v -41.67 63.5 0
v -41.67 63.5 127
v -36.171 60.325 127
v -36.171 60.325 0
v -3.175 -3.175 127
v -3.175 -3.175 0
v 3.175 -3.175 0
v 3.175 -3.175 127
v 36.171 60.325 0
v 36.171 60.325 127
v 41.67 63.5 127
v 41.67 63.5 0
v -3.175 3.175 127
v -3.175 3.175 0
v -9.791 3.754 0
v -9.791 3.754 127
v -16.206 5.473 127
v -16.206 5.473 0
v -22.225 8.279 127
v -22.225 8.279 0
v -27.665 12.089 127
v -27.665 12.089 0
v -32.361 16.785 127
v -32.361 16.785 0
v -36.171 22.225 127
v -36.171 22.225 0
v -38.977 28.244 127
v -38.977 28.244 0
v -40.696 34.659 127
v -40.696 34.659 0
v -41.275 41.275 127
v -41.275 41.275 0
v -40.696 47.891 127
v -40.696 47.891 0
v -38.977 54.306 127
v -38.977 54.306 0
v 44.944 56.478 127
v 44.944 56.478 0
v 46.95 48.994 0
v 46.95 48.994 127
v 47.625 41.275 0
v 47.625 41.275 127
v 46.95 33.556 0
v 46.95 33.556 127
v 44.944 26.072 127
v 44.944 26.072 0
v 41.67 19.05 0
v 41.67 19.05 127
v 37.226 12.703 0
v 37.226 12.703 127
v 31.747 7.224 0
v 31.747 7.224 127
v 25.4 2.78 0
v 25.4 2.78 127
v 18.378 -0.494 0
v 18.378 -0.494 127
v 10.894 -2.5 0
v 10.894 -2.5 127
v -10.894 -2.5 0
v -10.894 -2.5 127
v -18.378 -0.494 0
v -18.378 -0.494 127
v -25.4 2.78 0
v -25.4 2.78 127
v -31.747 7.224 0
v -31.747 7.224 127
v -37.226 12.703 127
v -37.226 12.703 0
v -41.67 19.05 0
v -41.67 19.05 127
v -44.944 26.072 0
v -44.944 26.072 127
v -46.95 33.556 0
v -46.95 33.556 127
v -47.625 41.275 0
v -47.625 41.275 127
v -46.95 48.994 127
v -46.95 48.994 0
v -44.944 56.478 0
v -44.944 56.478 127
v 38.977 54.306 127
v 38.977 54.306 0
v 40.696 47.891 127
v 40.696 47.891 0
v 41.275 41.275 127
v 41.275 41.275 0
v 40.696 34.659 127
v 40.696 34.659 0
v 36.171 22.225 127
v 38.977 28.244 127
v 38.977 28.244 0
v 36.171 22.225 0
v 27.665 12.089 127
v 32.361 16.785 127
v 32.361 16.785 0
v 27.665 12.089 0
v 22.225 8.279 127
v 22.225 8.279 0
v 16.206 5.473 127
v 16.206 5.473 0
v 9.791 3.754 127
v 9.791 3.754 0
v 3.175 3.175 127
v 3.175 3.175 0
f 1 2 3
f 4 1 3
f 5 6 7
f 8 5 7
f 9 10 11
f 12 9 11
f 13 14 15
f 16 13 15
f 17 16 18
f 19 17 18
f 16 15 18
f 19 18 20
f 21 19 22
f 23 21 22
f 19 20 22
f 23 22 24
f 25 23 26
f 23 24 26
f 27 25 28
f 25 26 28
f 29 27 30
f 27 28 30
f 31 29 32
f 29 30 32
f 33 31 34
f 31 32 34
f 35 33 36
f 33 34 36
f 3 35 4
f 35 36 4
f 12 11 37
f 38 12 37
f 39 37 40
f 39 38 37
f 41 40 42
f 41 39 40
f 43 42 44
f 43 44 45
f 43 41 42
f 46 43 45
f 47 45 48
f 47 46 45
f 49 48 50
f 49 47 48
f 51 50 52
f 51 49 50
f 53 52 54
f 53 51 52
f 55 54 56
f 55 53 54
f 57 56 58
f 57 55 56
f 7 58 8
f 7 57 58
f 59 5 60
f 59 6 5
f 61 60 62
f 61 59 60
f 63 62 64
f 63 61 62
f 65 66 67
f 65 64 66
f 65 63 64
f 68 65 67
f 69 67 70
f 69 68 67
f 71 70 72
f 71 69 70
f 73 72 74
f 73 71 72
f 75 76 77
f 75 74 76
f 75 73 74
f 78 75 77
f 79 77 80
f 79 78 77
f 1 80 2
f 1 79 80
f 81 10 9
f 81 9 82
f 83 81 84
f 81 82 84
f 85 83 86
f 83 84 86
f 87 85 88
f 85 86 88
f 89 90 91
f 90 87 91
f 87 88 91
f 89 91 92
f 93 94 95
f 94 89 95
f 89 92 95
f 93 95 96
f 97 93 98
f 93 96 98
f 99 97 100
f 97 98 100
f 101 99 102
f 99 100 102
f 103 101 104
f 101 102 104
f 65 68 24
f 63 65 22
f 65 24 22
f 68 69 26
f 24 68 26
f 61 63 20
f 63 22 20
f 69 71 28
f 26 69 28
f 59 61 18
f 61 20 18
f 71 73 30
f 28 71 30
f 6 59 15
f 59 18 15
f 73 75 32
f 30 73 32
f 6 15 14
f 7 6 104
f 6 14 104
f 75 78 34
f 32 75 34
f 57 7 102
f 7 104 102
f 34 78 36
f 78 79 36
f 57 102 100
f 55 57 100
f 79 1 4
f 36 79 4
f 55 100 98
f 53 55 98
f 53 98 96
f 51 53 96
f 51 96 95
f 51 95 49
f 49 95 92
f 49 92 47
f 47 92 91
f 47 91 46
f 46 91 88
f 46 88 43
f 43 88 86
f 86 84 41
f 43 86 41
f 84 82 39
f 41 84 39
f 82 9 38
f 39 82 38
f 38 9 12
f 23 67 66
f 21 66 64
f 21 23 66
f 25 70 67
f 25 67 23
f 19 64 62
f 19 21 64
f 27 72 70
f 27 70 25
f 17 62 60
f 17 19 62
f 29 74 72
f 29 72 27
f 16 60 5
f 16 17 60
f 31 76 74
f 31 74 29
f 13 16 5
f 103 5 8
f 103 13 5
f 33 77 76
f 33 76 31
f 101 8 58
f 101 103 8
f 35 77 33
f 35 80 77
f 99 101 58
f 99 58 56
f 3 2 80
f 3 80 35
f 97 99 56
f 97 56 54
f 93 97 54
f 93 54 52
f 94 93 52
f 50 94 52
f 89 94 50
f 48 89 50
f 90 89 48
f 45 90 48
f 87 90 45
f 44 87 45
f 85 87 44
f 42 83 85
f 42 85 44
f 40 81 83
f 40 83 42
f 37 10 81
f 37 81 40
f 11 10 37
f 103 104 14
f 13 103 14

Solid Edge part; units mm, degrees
sketch "Sketch1" plane through (0, 0, 0) normal (0, 0, 1) x (1, 0, 0)
  line L0 (-3.175, -3.175) -> (3.175, -3.175)
  line L1 (3.175, -3.175) -> (3.175, 3.175)
  line L2 (3.175, 3.175) -> (-3.175, 3.175)
  line L3 (-3.175, 3.175) -> (-3.175, -3.175)
  dimension "D1" = 6.35
  dimension "D2" = 6.35
extrude "Protrusion1" add sketch "Sketch1" along normal blind 127
sketch "Sketch2" plane through (0, 0, 0) normal (0, 0, -1) x (1, 0, 0)
  line L0 (-3.175, -3.175) -> (-3.175, 3.175)
  line L1 (-41.6698, -63.5) -> (-36.1706, -60.325)
  arc A0 (-3.175, -3.175) -> (-36.1706, -60.325) centre (-3.175, -41.275) ccw
  arc A1 (-41.6698, -63.5) -> (-3.175, 3.175) centre (-3.175, -41.275) cw
extrude "ExtrudedProtrusion_2" add sketch "Sketch2" against normal blind 127
mirror "Mirror1" about plane through (0, 0, 0) normal (1, 0, 0) of "ExtrudedProtrusion_2"
properties part number "SPaRC - 02 - 004"
